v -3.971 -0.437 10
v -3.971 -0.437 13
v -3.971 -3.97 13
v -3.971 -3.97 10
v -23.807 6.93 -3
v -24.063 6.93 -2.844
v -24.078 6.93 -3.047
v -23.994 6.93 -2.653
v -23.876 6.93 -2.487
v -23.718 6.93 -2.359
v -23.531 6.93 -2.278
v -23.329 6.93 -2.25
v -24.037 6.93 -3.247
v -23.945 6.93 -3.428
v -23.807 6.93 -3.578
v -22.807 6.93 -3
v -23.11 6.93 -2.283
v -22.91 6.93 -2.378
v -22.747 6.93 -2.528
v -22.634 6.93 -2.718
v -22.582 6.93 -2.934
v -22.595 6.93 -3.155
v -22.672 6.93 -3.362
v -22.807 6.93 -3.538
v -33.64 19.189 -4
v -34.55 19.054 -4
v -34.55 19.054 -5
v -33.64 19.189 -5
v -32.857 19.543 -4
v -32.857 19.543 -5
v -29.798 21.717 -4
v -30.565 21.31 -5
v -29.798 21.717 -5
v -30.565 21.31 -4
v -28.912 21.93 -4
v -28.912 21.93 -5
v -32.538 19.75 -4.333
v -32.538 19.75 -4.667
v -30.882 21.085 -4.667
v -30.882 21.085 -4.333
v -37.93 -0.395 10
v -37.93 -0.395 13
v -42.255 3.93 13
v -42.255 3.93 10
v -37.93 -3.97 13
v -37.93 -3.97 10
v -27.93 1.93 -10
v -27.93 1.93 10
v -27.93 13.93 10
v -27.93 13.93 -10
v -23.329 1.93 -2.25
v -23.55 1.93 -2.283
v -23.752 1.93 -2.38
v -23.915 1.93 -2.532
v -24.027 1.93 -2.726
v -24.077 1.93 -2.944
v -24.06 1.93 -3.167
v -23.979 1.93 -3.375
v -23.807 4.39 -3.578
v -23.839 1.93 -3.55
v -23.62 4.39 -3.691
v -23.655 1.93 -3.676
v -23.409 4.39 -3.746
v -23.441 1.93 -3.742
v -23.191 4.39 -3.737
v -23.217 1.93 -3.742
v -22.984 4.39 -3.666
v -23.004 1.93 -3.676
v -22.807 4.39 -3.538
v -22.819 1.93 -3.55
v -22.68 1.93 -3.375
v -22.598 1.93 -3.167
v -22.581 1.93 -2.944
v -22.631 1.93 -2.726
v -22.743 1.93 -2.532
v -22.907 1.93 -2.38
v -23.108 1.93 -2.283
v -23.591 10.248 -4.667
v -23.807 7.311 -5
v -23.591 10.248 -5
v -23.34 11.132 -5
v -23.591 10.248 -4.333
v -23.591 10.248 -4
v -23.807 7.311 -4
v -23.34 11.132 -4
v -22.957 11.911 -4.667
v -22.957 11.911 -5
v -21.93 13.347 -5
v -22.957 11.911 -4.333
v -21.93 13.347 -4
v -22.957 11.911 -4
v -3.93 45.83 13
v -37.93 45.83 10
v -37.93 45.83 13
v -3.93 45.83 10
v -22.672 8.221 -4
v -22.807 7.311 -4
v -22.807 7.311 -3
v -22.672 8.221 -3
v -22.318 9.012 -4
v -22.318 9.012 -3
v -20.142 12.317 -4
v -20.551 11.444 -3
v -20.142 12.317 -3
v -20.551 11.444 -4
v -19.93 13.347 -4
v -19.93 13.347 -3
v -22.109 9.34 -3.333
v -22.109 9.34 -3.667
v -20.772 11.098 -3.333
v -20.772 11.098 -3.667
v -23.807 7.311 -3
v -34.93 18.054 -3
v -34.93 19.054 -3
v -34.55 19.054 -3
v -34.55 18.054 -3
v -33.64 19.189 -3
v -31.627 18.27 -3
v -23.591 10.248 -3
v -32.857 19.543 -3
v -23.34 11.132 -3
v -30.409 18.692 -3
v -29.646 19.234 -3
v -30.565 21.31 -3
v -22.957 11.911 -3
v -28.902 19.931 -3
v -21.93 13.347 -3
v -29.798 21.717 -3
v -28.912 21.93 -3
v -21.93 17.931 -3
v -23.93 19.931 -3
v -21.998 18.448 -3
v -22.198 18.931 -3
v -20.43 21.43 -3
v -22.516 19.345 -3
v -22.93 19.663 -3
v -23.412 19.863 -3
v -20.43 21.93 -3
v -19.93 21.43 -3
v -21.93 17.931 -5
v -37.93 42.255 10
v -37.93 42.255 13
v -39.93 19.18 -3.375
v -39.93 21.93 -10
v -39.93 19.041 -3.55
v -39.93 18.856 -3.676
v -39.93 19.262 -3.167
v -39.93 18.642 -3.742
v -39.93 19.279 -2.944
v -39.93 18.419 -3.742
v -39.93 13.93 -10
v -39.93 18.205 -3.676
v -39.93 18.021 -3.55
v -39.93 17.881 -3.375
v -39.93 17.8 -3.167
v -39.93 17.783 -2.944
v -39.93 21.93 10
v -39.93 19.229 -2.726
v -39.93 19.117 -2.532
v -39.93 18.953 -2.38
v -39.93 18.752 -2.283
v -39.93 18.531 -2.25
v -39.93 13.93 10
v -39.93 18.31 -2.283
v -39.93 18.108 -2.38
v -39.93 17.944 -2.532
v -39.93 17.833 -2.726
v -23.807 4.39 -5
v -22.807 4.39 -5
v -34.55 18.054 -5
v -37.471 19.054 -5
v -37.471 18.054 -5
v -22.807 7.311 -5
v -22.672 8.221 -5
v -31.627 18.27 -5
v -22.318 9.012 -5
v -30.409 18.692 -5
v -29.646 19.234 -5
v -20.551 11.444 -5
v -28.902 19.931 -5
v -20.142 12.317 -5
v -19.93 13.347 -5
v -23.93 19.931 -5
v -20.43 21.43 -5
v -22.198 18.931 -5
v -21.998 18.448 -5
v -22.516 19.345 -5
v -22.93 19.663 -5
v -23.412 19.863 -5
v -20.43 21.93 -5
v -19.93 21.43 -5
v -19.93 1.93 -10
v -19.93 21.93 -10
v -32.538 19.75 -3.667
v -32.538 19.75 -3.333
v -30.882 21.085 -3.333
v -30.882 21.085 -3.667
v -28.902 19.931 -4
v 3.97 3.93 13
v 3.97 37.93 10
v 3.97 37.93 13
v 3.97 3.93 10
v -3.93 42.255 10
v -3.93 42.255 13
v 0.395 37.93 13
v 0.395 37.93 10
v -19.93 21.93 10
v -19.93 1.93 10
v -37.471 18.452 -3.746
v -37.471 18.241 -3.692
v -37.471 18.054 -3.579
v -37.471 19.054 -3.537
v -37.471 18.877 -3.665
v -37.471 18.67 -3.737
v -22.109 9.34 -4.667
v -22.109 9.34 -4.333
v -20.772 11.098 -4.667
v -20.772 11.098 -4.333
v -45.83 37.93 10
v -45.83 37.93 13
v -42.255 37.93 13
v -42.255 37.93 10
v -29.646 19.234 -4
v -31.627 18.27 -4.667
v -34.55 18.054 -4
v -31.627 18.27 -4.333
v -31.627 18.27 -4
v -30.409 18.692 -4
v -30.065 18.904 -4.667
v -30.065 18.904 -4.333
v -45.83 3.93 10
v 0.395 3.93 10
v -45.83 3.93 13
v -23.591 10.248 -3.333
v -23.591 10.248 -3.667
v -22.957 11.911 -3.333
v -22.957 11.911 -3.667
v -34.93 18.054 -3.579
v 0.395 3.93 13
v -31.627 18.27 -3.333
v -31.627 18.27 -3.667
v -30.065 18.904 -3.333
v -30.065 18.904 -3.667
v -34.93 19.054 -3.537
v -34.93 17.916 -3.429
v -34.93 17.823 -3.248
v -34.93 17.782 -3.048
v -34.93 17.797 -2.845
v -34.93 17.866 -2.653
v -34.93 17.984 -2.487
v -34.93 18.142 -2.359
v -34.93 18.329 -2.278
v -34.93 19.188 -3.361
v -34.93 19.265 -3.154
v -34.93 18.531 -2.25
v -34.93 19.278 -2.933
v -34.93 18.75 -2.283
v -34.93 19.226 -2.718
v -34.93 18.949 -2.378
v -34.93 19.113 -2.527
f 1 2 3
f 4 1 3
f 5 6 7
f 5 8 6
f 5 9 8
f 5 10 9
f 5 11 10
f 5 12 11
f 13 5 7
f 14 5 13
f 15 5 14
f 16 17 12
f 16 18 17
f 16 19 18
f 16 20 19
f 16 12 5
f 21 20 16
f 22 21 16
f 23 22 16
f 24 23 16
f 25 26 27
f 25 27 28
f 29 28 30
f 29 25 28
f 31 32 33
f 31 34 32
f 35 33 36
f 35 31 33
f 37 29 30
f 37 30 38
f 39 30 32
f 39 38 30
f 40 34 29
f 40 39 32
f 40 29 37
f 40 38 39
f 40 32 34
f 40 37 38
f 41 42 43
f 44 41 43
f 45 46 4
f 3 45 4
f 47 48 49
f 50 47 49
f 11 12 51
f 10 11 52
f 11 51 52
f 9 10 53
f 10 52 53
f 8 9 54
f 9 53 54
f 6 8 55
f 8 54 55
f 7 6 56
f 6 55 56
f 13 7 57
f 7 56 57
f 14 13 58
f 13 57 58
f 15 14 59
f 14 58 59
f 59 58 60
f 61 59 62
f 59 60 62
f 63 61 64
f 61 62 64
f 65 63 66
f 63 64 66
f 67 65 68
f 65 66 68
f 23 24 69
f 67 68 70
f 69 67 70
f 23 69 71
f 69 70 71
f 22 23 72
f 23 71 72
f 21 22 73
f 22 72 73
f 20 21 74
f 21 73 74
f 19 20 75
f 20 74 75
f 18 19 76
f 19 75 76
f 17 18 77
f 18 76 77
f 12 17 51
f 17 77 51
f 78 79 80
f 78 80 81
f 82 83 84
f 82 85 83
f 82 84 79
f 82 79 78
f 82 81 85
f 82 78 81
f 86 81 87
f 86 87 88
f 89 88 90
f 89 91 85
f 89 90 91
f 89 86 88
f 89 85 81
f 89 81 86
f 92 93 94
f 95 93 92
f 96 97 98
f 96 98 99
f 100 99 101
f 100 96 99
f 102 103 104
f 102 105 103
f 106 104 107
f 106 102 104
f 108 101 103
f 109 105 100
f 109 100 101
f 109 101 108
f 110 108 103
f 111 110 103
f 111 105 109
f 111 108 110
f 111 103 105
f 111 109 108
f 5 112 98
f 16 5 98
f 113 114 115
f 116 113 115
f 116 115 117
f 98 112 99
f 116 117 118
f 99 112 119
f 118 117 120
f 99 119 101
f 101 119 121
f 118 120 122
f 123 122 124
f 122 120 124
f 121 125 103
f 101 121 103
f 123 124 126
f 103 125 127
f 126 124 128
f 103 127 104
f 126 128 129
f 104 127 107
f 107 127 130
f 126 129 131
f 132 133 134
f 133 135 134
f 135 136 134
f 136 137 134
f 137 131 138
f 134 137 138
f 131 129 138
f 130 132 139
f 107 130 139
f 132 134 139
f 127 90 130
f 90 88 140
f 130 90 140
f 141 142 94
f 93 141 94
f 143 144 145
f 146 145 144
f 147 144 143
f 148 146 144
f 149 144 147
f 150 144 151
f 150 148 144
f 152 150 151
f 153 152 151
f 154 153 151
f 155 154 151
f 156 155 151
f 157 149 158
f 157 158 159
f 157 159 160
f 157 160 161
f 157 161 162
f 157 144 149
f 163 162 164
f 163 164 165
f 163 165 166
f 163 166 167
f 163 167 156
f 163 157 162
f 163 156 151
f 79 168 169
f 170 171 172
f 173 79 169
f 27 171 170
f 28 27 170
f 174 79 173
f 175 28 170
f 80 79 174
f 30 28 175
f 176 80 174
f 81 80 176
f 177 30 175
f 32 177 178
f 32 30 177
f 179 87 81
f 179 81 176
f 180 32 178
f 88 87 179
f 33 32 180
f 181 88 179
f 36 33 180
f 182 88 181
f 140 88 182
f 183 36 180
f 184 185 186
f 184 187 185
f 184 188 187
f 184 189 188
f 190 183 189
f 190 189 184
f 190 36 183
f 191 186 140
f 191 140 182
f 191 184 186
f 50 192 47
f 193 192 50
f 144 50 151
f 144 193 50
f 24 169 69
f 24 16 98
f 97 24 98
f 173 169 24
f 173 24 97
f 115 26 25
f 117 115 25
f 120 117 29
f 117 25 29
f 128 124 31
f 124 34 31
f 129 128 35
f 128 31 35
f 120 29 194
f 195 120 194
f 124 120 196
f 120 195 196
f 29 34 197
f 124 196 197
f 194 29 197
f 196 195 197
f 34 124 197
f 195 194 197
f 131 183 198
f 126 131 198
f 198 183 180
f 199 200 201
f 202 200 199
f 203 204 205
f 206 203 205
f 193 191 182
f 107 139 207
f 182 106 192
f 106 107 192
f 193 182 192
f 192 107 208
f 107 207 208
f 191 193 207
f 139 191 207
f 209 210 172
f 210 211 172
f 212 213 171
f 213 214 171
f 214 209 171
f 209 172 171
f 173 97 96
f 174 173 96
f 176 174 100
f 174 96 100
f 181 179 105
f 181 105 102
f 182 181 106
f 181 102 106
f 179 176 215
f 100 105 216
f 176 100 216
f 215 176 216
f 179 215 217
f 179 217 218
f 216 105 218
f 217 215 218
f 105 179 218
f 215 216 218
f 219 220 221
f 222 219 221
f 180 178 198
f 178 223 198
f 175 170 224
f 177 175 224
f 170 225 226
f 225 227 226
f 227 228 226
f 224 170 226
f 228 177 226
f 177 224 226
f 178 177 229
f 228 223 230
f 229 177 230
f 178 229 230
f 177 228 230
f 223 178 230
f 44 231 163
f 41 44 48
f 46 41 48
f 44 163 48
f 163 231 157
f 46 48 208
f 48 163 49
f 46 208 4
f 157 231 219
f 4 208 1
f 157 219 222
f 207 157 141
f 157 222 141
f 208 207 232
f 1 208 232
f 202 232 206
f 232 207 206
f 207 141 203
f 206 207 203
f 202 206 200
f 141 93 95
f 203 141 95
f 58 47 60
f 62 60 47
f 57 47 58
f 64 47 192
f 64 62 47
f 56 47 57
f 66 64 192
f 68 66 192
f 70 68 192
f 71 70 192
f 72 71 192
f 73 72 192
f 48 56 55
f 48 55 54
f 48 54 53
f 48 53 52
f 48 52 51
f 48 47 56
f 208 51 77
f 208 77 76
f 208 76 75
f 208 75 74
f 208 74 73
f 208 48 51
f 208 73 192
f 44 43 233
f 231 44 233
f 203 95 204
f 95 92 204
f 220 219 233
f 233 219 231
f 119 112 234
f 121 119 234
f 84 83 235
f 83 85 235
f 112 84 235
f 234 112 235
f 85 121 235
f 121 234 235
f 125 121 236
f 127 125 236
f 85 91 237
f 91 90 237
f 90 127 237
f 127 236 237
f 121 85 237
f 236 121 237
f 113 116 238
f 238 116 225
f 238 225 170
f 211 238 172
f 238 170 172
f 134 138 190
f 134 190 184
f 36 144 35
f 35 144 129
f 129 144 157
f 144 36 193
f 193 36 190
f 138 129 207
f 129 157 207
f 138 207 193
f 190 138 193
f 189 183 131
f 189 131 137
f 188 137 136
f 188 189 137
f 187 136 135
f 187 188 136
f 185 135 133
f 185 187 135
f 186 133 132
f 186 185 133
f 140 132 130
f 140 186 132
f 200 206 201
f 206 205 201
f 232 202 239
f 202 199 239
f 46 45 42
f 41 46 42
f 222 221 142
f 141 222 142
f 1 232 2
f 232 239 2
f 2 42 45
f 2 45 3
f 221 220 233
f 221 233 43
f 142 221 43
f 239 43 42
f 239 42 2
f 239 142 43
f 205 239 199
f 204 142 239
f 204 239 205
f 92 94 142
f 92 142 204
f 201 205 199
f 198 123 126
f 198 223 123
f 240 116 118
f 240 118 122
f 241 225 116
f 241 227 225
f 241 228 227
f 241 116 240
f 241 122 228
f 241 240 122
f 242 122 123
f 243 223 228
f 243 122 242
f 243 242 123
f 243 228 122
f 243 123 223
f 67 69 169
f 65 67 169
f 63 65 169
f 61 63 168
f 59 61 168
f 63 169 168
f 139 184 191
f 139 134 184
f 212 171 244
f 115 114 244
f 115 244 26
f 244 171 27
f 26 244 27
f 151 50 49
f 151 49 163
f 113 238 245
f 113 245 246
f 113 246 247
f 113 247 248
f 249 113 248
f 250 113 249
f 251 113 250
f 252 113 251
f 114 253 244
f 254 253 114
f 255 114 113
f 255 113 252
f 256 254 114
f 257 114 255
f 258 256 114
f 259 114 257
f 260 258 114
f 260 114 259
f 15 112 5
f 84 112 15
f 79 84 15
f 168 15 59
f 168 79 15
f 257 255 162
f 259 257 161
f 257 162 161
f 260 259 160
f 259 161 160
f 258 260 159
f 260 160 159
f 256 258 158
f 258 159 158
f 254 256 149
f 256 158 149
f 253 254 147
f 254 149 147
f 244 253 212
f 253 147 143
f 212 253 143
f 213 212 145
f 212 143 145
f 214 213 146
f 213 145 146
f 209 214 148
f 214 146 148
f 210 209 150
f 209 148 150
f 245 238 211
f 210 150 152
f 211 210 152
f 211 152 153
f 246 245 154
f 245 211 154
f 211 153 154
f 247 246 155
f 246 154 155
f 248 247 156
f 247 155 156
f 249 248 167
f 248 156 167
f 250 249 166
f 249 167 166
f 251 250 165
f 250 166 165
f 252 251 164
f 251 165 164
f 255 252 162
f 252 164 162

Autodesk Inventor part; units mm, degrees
ref_plane "YZ Plane" through (0, 0, 0) normal (1, 0, 0) x (0, 1, 0)
ref_plane "XZ Plane" through (0, 0, 0) normal (0, 1, 0) x (-1, 0, 0)
ref_plane "Work Plane1" through (0, 0, 10) normal (0, 0, 1) x (1, 0, 0)
sketch "Sketch1" plane through (0, 0, 10) normal (0, 0, 1) x (1, 0, 0)
  line L0 (-4.0299, -0.3538) -> (-2.2322, 1.4439) construction
  arc A0 (-1.4439, 2.2322) -> (-2.2322, 1.4439) centre (-0.9299, 0.9299) ccw construction
  line L1 (-1.4439, 2.2322) -> (0.3538, 4.0299) construction
  line L2 (-37.8299, 42.8299) -> (-37.8299, 37.8299) construction
  line L3 (-37.8299, 37.8299) -> (-42.9208, 37.8299) construction
  line L4 (-37.8299, 42.2137) -> (-37.8299, 45.8299) construction
  line L5 (-37.8299, 45.8299) -> (-4.0299, 45.8299) construction
  line L6 (-4.0299, 45.8299) -> (-4.0299, 42.2137) construction
  line L7 (-4.0299, 4.0299) -> (0.3538, 4.0299) projected
  circle A1 centre (-20.9299, 20.9299) radius 17.5 projected
  line L8 (-20.9299, 58.9723) -> (17.1124, 20.9299) construction
  line L9 (17.1124, 20.9299) -> (-20.9299, -17.1124) construction
  line L10 (-20.9299, -17.1124) -> (-58.9723, 20.9299) construction
  line L11 (-58.9723, 20.9299) -> (-20.9299, 58.9723) construction
  line L12 (-20.9299, 58.9723) -> (-20.9299, -17.1124) construction
  line L13 (17.1124, 20.9299) -> (-58.9723, 20.9299) construction
  line L14 (-20.9299, 58.9723) -> (32.8701, 58.9723) construction
  line L15 (-43.4299, 43.4299) -> (1.5701, 43.4299) construction
  line L16 (1.5701, 43.4299) -> (1.5701, -1.5701) construction
  line L17 (1.5701, -1.5701) -> (-43.4299, -1.5701) construction
  line L18 (-43.4299, -1.5701) -> (-43.4299, 43.4299) construction
  line L19 (-43.4299, 43.4299) -> (1.5701, -1.5701) construction
  line L20 (1.5701, 43.4299) -> (-43.4299, -1.5701) construction
  line L21 (-43.4299, 5.3876) -> (-43.4299, 36.4723)
  line L22 (-43.4299, 36.4723) -> (-36.4723, 43.4299)
  line L23 (-36.4723, 43.4299) -> (-5.3876, 43.4299)
  line L24 (-5.3876, 43.4299) -> (1.5701, 36.4723)
  line L25 (1.5701, 36.4723) -> (1.5701, 5.3876)
  line L26 (1.5701, 5.3876) -> (-5.3876, -1.5701)
  line L27 (-5.3876, -1.5701) -> (-36.4723, -1.5701)
  line L28 (-36.4723, -1.5701) -> (-43.4299, 5.3876)
  line L29 (-4.0299, 42.2137) -> (-37.8299, 42.2137) projected
  line L30 (-4.0299, -0.3538) -> (-4.0299, 4.0299) projected
  circle A2 centre (-20.9299, 20.9299) radius 1.5
  line L31 (-10.9299, 10.9299) -> (-30.9299, 10.9299) construction
  line L32 (-30.9299, 10.9299) -> (-30.9299, 30.9299) construction
  line L33 (-30.9299, 30.9299) -> (-10.9299, 30.9299) construction
  line L34 (-10.9299, 30.9299) -> (-10.9299, 10.9299) construction
  line L35 (-10.9299, 10.9299) -> (-30.9299, 30.9299) construction
  line L36 (-30.9299, 10.9299) -> (-10.9299, 30.9299) construction
  circle A3 centre (-30.9299, 30.9299) radius 1.4
  circle A4 centre (-30.9299, 10.9299) radius 1.4
  circle A5 centre (-10.9299, 10.9299) radius 1.4
  line L37 (-45.8299, 37.8299) -> (-42.0723, 37.8299) construction
  line L38 (-42.1723, 37.7299) -> (-45.8299, 37.7299)
  line L39 (-45.8299, 37.7299) -> (-45.8299, 4.1299)
  line L40 (-45.8299, 4.1299) -> (-42.1723, 4.1299)
  line L41 (-42.1723, 4.1299) -> (-42.1723, 37.7299)
  line L42 (-45.8299, 4.0299) -> (-42.0723, 4.0299) construction
  line L43 (-45.8299, 37.8299) -> (-42.0723, 37.8299) projected
  line L44 (-37.7299, 45.8299) -> (-4.1299, 45.8299)
  line L45 (-4.1299, 45.8299) -> (-4.1299, 42.1723)
  line L46 (-4.1299, 42.1723) -> (-37.7299, 42.1723)
  line L47 (-37.7299, 42.1723) -> (-37.7299, 45.8299)
  line L48 (0.4701, 37.8299) -> (0.4701, 4.0299) construction
  line L49 (0.4701, 4.0299) -> (3.9701, 4.0299) construction
  line L50 (3.9701, 37.8299) -> (3.9701, 4.0299) construction
  line L51 (0.4701, 37.8299) -> (3.9701, 37.8299) construction
  line L52 (-45.8299, -3.9701) -> (-4.0299, -3.9701) construction
  line L53 (0.3124, 37.7299) -> (3.9701, 37.7299)
  line L54 (3.9701, 37.7299) -> (3.9701, 4.1299)
  line L55 (3.9701, 4.1299) -> (0.3124, 4.1299)
  line L56 (0.3124, 4.1299) -> (0.3124, 37.7299)
  line L57 (-4.1713, -0.3538) -> (-37.7299, -0.3538)
  line L58 (-37.7299, -0.3538) -> (-37.7299, -3.9701)
  line L59 (-37.7299, -3.9701) -> (-4.1713, -3.9701)
  line L60 (-4.1713, -3.9701) -> (-4.1713, -0.3538)
  point P0 (-37.8299, 4.0299)
  dimension "d18" = 53.8
  dimension "d19" = 45
  dimension "d20" = 53.8
  dimension "d21" = 45
  dimension "d22" = 45
  dimension "d30" = 20
  dimension "d31" = 20
  dimension "d32" = 2.8
  dimension "d33" = 2.8
  dimension "d34" = 2.8
  dimension "d35" = 3
  dimension "d36" = 0.1
  dimension "d37" = 0.1
  dimension "d38" = 0.1
  dimension "d39" = 0.1
extrude "Extrusion1" add sketch "Sketch1" along normal blind 3 contours L30 L26 L57 L28 L41 L22 L46 L24 L56 L7 | L7 L26 L30 | L56 L24 L25 L26 | L26 L25 L24 L53 L54 L55 | L60 L59 L58 L57 L28 L27 L26 | L26 L27 L28 L57 | L46 L22 L29 L24 | L24 L29 L45 | L40 L39 L38 L22 L21 L28 | L28 L21 L22 L41 | L29 L22 L23 L24 | L24 L23 L22 L29 L47 L44 L45 | L47 L29 L22 | A1 | A2 | A3 | A4 | A5
sketch "Skizze4" plane through (0, 0, 13) normal (0, 0, 1) x (1, 0, 0)
  line L0 (-37.7299, 42.1723) -> (-42.1723, 37.7299) projected
  line L1 (-42.1723, 37.7299) -> (-45.8299, 37.7299) projected
  line L2 (-45.8299, 37.7299) -> (-45.8299, 4.1299) construction
  line L3 (-45.8299, 4.1299) -> (-42.1723, 4.1299) projected
  line L4 (-42.1723, 4.1299) -> (-37.6885, -0.3538) projected
  line L5 (-37.6885, -0.3538) -> (-37.7299, -0.3538) projected
  line L6 (-37.7299, -0.3538) -> (-37.7299, -3.9701) projected
  line L7 (-37.7299, -3.9701) -> (-4.1713, -3.9701) construction
  line L8 (-4.1713, -3.9701) -> (-4.1713, -0.3538) projected
  line L9 (-4.1713, -0.3538) -> (0.3124, 4.1299) projected
  line L10 (0.3124, 4.1299) -> (3.9701, 4.1299) projected
  line L11 (3.9701, 4.1299) -> (3.9701, 37.7299) construction
  line L12 (3.9701, 37.7299) -> (0.3124, 37.7299) projected
  line L13 (0.3124, 37.7299) -> (-4.1299, 42.1723) projected
  line L14 (-4.1299, 42.1723) -> (-4.1299, 45.8299) projected
  line L15 (-4.1299, 45.8299) -> (-37.7299, 45.8299) construction
  line L16 (-37.7299, 45.8299) -> (-37.7299, 42.1723) projected
  line L17 (-37.9299, 46.0299) -> (-3.9299, 46.0299) construction
  line L18 (-3.9299, 46.0299) -> (-3.9299, 42.2551)
  line L19 (-3.9299, 42.2551) -> (0.3953, 37.9299)
  line L20 (0.3953, 37.9299) -> (4.1701, 37.9299)
  line L21 (4.1701, 37.9299) -> (4.1701, 3.9299) construction
  line L22 (4.1701, 3.9299) -> (0.3953, 3.9299)
  line L23 (0.3953, 3.9299) -> (-3.9713, -0.4367)
  line L24 (-3.9713, -0.4367) -> (-3.9713, -4.1701)
  line L25 (-3.9713, -4.1701) -> (-37.9299, -4.1701) construction
  line L26 (-37.9299, -4.1701) -> (-37.9299, -0.3953)
  line L27 (-37.9299, -0.3953) -> (-42.2551, 3.9299)
  line L28 (-42.2551, 3.9299) -> (-46.0299, 3.9299)
  line L29 (-46.0299, 3.9299) -> (-46.0299, 37.9299) construction
  line L30 (-46.0299, 37.9299) -> (-42.2551, 37.9299)
  line L31 (-42.2551, 37.9299) -> (-37.9299, 42.2551)
  line L32 (-37.9299, 42.2551) -> (-37.9299, 46.0299)
  line L33 (-45.8299, 37.7299) -> (-45.8299, 37.9299)
  line L34 (-4.1299, 45.8299) -> (-37.7299, 45.8299) projected
  line L35 (-37.7299, 45.8299) -> (-37.9299, 45.8299)
  line L36 (-4.1299, 45.8299) -> (-3.9299, 45.8299)
  line L37 (3.9701, 37.7299) -> (3.9701, 37.9299)
  line L38 (3.9701, 4.1299) -> (3.9701, 37.7299) projected
  line L39 (3.9701, 4.1299) -> (3.9701, 3.9299)
  line L40 (-4.1713, -3.9701) -> (-3.9713, -3.9701)
  line L41 (-37.7299, -3.9701) -> (-37.9299, -3.9701)
  line L42 (-45.8299, 4.1299) -> (-45.8299, 3.9299)
  point P0 (0, 0)
  dimension "d40" = 0.2
extrude "IM_offset" add sketch "Skizze4" against normal up to surface (3 mm away)
ref_plane "Arbeitsebene5" through (-20.9299, 3.9299, 10) normal (1, 0, 0) x (0, 0, -1)
ref_plane "Arbeitsebene6" through (-37.9299, 20.9299, 10) normal (0, 1, 0) x (1, 0, 0)
sketch "Skizze36" plane through (0, 0, 10) normal (0, 0, -1) x (-1, 0, 0)
  line L0 (-13.9301, 20.9299) -> (55.7899, 20.9299) projected
  line L1 (20.9299, -13.9301) -> (20.9299, 55.7899) projected
  line L2 (19.9299, 21.9299) -> (39.9299, 21.9299)
  line L3 (39.9299, 21.9299) -> (39.9299, 1.9299)
  line L4 (39.9299, 1.9299) -> (19.9299, 1.9299)
  line L5 (19.9299, 1.9299) -> (19.9299, 21.9299)
  line L6 (39.9299, 1.9299) -> (27.9299, 1.9299)
  line L7 (27.9299, 1.9299) -> (27.9299, 13.9299)
  line L8 (27.9299, 13.9299) -> (39.9299, 13.9299)
  line L9 (39.9299, 13.9299) -> (39.9299, 1.9299)
  point P0 (0, 0)
  point P1 (39.9299, 13.9299)
  point P2 (39.9299, 20.9299)
  point P3 (20.9299, 20.9299)
  point P4 (20.9299, 1.9299)
  point P5 (27.9299, 1.9299)
  dimension "d197" = 20
  dimension "d198" = 20
  dimension "d199" = 1
  dimension "d200" = 1
  dimension "d201" = 12
  dimension "d202" = 12
extrude "Extrusion32" add sketch "Skizze36" along normal blind 20 contours L5 L2 L1 L0 | L0 L1 L4 L5 | L1 L2 L3 L0 | L0 L3 L8 L7 L4 L1
ref_plane "Arbeitsebene10" through (0, 0, -4) normal (0, 0, 1) x (1, 0, 0)
sketch "Skizze37" plane through (0, 0, -4) normal (0, 0, 1) x (1, 0, 0)
  line L0 (-19.9299, 1.3901) -> (-19.9299, 21.9308)
  line L1 (-19.9299, 21.9308) -> (-19.9299, 13.3467)
  line L2 (-19.9299, 13.3467) -> (-21.9299, 13.3467)
  line L3 (-21.9299, 13.3467) -> (-21.9299, 17.9308)
  line L4 (-21.9299, 21.9308) -> (-19.9299, 21.9308)
  line L5 (-40.9299, 1.3901) -> (-19.9299, 1.3901)
  line L6 (-22.807, 4.3901) -> (-22.807, 7.3107)
  line L7 (-23.807, 7.3107) -> (-23.807, 4.3901)
  line L8 (-22.807, 7.3107) -> (-22.807, 9.7285) construction
  line L9 (-22.807, 9.7285) -> (-20.1457, 10.6003) construction
  line L10 (-20.1457, 10.6003) -> (-19.9299, 13.3467) construction
  spline S0 degree 3 poles (-22.807, 7.3107) (-22.807, 9.7285) (-20.1457, 10.6003) (-19.9299, 13.3467) knots 1 1 1 1 2 2 2 2
  spline S1 degree 3 poles (-23.807, 7.3107) (-23.807, 11.2353) (-23.1457, 11.6741) (-21.9299, 13.3467) knots 1 1 1 1 2 2 2 2
  line L11 (-23.807, 7.3107) -> (-23.807, 11.2353) construction
  line L12 (-23.807, 11.2353) -> (-23.1457, 11.6741) construction
  line L13 (-23.1457, 11.6741) -> (-21.9299, 13.3467) construction
  line L14 (-21.9299, 21.9308) -> (-21.9299, 19.9308)
  line L15 (-23.9299, 19.9308) -> (-28.9019, 19.9308)
  line L16 (-28.9019, 19.9308) -> (-28.9019, 21.9308)
  line L17 (-28.9019, 21.9308) -> (-21.9299, 21.9308)
  line L18 (-19.9299, 21.9308) -> (-29.9299, 11.9308) construction
  line L19 (-28.9019, 21.9308) -> (-28.9019, 19.9308)
  line L20 (-31.2605, 21.715) -> (-28.9019, 21.9308) construction
  spline S2 degree 3 poles (-34.55, 19.0538) (-32.1323, 19.0538) (-31.2605, 21.715) (-28.9019, 21.9308) knots 1 1 1 1 2 2 2 2
  line L21 (-34.55, 19.0538) -> (-32.1323, 19.0538) construction
  line L22 (-32.1323, 19.0538) -> (-31.2605, 21.715) construction
  line L23 (-30.1867, 18.715) -> (-28.9019, 19.9308) construction
  spline S3 degree 3 poles (-34.55, 18.0538) (-30.6255, 18.0538) (-30.1867, 18.715) (-28.9019, 19.9308) knots 1 1 1 1 2 2 2 2
  line L24 (-34.55, 18.0538) -> (-30.6255, 18.0538) construction
  line L25 (-30.6255, 18.0538) -> (-30.1867, 18.715) construction
  line L26 (-37.4706, 19.0538) -> (-34.55, 19.0538)
  line L27 (-34.55, 18.0538) -> (-37.4706, 18.0538)
  line L28 (-40.4706, 18.0538) -> (-40.4706, 19.0538)
  line L29 (-22.807, 4.3901) -> (-23.807, 4.3901)
  line L30 (-37.4706, 18.0538) -> (-37.4706, 19.0538)
  arc A0 (-21.9299, 17.9308) -> (-23.9299, 19.9308) centre (-23.9299, 17.9308) ccw
  line L31 (-19.9299, 1.9299) -> (-19.9299, 21.9299) projected
  point P0 (0, 0)
  point P1 (-22.807, 1.3901)
  point P2 (-40.4706, 21.9308)
  point P3 (-19.9299, 13.3467)
  dimension "d206" = 2
  dimension "d207" = 2
  dimension "d208" = 1
  dimension "d209" = 3
  dimension "d210" = 3
  dimension "d211" = 2
  dimension "d214" = 0
extrude "Extrusion33" cut sketch "Skizze37" along normal mid plane 2
ref_plane "Arbeitsebene11" through (-19.9299, 21.9299, 10) normal (0.7071, -0.7071, 0) x (0, 0, -1)
sketch "Skizze38" plane through (-39.9299, 13.9299, 10) normal (-1, 0, 0) x (0, 0, 1)
  line L0 (-13, 8) -> (-15, 8) projected
  line L1 (-15, 4.1239) -> (-13, 4.1239) projected
  line L2 (-15, 5.1239) -> (-13, 5.1239) projected
  circle A0 centre (-13, 4.6008) radius 0.75
  point P0 (-10, -13.9299)
  dimension "d215" = 1.5
extrude "Extrusion34" cut sketch "Skizze38" against normal blind 5
mirror "Spiegeln3" about plane through (-19.9299, 21.9299, 10) normal (0.7071, -0.7071, 0) of "Extrusion34"
sketch "Skizze39" plane through (0, 0, -3) normal (0, 0, -1) x (-1, 0, 0)
  line L0 (39.9299, 13.9299) -> (39.9299, 21.9299) projected
  line L1 (39.9299, 21.9299) -> (19.9299, 21.9299) projected
  line L2 (19.9299, 21.9299) -> (19.9299, 1.9299) projected
  line L3 (19.9299, 1.9299) -> (27.9299, 1.9299) projected
  line L4 (27.9299, 1.9299) -> (27.9299, 13.9299) projected
  line L5 (27.9299, 13.9299) -> (39.9299, 13.9299) projected
  line L6 (19.9299, 21.9299) -> (20.4299, 21.9299)
  line L7 (20.4299, 21.9299) -> (20.4299, 21.4299)
  line L8 (20.4299, 21.4299) -> (19.9299, 21.4299)
  line L9 (19.9299, 21.4299) -> (19.9299, 21.9299)
  point P0 (0, 0)
  dimension "d218" = 0.5
  dimension "d219" = 0.5
extrude "Extrusion35" add sketch "Skizze39" along normal up to surface (2 mm away) contours L7 L8 L2 L1
properties part number "20_Cube_Insert_Lightsheet_Flowcube_rectangular_v3"
